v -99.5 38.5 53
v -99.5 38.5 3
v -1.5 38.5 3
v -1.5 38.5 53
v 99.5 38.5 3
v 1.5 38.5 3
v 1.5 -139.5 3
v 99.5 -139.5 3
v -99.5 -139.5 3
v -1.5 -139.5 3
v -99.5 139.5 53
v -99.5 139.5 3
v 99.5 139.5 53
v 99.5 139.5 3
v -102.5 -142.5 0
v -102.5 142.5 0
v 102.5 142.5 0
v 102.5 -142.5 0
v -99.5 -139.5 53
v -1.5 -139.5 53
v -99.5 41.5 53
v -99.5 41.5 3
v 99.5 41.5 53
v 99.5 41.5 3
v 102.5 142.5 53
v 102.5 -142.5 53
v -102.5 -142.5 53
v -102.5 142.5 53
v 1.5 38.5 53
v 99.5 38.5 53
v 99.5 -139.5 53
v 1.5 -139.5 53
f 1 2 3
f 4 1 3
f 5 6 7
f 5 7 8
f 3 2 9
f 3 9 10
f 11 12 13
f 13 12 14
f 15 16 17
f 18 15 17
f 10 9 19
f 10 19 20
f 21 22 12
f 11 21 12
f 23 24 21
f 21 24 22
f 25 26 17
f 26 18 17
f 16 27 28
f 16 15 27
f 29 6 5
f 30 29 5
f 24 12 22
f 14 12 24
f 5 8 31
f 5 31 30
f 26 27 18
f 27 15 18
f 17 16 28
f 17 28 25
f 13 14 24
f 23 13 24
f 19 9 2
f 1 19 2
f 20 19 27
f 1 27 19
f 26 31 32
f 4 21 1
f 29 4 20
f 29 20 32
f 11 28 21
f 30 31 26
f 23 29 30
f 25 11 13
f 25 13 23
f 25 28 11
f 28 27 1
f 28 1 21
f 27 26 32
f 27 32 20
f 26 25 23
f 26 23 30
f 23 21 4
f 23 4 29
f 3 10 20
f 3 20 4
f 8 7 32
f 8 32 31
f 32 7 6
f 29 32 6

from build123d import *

# Parameters (mm, degrees)
F0_W     = 205
F0_H     = 285
F1_DEPTH = 3
F2_W     = 205
F2_H     = 285
F2_W_2   = 98
F2_H_2   = 178
F3_DEPTH = 50


with BuildPart() as f1:
    # F0 (on Top) → F1 (new body)
    with BuildSketch(Plane.XY):
        Rectangle(F0_W, F0_H)
    extrude(amount=F1_DEPTH)

    # F2 (on face) → F3 (join)
    with BuildSketch(Plane.XY.offset(3)):
        Rectangle(F2_W, F2_H)
        with Locations((-50.5, -50.5)):
            Rectangle(F2_W_2, F2_H_2, mode=Mode.SUBTRACT)
        with Locations((50.5, -50.5)):
            Rectangle(F2_W_2, F2_H_2, mode=Mode.SUBTRACT)
        Polygon((-99.5, 139.5), (99.5, 139.5), (99.5, 41.5), (0, 41.5), (-99.5, 41.5), align=None, mode=Mode.SUBTRACT)
    extrude(amount=F3_DEPTH)


solid = f1.part
